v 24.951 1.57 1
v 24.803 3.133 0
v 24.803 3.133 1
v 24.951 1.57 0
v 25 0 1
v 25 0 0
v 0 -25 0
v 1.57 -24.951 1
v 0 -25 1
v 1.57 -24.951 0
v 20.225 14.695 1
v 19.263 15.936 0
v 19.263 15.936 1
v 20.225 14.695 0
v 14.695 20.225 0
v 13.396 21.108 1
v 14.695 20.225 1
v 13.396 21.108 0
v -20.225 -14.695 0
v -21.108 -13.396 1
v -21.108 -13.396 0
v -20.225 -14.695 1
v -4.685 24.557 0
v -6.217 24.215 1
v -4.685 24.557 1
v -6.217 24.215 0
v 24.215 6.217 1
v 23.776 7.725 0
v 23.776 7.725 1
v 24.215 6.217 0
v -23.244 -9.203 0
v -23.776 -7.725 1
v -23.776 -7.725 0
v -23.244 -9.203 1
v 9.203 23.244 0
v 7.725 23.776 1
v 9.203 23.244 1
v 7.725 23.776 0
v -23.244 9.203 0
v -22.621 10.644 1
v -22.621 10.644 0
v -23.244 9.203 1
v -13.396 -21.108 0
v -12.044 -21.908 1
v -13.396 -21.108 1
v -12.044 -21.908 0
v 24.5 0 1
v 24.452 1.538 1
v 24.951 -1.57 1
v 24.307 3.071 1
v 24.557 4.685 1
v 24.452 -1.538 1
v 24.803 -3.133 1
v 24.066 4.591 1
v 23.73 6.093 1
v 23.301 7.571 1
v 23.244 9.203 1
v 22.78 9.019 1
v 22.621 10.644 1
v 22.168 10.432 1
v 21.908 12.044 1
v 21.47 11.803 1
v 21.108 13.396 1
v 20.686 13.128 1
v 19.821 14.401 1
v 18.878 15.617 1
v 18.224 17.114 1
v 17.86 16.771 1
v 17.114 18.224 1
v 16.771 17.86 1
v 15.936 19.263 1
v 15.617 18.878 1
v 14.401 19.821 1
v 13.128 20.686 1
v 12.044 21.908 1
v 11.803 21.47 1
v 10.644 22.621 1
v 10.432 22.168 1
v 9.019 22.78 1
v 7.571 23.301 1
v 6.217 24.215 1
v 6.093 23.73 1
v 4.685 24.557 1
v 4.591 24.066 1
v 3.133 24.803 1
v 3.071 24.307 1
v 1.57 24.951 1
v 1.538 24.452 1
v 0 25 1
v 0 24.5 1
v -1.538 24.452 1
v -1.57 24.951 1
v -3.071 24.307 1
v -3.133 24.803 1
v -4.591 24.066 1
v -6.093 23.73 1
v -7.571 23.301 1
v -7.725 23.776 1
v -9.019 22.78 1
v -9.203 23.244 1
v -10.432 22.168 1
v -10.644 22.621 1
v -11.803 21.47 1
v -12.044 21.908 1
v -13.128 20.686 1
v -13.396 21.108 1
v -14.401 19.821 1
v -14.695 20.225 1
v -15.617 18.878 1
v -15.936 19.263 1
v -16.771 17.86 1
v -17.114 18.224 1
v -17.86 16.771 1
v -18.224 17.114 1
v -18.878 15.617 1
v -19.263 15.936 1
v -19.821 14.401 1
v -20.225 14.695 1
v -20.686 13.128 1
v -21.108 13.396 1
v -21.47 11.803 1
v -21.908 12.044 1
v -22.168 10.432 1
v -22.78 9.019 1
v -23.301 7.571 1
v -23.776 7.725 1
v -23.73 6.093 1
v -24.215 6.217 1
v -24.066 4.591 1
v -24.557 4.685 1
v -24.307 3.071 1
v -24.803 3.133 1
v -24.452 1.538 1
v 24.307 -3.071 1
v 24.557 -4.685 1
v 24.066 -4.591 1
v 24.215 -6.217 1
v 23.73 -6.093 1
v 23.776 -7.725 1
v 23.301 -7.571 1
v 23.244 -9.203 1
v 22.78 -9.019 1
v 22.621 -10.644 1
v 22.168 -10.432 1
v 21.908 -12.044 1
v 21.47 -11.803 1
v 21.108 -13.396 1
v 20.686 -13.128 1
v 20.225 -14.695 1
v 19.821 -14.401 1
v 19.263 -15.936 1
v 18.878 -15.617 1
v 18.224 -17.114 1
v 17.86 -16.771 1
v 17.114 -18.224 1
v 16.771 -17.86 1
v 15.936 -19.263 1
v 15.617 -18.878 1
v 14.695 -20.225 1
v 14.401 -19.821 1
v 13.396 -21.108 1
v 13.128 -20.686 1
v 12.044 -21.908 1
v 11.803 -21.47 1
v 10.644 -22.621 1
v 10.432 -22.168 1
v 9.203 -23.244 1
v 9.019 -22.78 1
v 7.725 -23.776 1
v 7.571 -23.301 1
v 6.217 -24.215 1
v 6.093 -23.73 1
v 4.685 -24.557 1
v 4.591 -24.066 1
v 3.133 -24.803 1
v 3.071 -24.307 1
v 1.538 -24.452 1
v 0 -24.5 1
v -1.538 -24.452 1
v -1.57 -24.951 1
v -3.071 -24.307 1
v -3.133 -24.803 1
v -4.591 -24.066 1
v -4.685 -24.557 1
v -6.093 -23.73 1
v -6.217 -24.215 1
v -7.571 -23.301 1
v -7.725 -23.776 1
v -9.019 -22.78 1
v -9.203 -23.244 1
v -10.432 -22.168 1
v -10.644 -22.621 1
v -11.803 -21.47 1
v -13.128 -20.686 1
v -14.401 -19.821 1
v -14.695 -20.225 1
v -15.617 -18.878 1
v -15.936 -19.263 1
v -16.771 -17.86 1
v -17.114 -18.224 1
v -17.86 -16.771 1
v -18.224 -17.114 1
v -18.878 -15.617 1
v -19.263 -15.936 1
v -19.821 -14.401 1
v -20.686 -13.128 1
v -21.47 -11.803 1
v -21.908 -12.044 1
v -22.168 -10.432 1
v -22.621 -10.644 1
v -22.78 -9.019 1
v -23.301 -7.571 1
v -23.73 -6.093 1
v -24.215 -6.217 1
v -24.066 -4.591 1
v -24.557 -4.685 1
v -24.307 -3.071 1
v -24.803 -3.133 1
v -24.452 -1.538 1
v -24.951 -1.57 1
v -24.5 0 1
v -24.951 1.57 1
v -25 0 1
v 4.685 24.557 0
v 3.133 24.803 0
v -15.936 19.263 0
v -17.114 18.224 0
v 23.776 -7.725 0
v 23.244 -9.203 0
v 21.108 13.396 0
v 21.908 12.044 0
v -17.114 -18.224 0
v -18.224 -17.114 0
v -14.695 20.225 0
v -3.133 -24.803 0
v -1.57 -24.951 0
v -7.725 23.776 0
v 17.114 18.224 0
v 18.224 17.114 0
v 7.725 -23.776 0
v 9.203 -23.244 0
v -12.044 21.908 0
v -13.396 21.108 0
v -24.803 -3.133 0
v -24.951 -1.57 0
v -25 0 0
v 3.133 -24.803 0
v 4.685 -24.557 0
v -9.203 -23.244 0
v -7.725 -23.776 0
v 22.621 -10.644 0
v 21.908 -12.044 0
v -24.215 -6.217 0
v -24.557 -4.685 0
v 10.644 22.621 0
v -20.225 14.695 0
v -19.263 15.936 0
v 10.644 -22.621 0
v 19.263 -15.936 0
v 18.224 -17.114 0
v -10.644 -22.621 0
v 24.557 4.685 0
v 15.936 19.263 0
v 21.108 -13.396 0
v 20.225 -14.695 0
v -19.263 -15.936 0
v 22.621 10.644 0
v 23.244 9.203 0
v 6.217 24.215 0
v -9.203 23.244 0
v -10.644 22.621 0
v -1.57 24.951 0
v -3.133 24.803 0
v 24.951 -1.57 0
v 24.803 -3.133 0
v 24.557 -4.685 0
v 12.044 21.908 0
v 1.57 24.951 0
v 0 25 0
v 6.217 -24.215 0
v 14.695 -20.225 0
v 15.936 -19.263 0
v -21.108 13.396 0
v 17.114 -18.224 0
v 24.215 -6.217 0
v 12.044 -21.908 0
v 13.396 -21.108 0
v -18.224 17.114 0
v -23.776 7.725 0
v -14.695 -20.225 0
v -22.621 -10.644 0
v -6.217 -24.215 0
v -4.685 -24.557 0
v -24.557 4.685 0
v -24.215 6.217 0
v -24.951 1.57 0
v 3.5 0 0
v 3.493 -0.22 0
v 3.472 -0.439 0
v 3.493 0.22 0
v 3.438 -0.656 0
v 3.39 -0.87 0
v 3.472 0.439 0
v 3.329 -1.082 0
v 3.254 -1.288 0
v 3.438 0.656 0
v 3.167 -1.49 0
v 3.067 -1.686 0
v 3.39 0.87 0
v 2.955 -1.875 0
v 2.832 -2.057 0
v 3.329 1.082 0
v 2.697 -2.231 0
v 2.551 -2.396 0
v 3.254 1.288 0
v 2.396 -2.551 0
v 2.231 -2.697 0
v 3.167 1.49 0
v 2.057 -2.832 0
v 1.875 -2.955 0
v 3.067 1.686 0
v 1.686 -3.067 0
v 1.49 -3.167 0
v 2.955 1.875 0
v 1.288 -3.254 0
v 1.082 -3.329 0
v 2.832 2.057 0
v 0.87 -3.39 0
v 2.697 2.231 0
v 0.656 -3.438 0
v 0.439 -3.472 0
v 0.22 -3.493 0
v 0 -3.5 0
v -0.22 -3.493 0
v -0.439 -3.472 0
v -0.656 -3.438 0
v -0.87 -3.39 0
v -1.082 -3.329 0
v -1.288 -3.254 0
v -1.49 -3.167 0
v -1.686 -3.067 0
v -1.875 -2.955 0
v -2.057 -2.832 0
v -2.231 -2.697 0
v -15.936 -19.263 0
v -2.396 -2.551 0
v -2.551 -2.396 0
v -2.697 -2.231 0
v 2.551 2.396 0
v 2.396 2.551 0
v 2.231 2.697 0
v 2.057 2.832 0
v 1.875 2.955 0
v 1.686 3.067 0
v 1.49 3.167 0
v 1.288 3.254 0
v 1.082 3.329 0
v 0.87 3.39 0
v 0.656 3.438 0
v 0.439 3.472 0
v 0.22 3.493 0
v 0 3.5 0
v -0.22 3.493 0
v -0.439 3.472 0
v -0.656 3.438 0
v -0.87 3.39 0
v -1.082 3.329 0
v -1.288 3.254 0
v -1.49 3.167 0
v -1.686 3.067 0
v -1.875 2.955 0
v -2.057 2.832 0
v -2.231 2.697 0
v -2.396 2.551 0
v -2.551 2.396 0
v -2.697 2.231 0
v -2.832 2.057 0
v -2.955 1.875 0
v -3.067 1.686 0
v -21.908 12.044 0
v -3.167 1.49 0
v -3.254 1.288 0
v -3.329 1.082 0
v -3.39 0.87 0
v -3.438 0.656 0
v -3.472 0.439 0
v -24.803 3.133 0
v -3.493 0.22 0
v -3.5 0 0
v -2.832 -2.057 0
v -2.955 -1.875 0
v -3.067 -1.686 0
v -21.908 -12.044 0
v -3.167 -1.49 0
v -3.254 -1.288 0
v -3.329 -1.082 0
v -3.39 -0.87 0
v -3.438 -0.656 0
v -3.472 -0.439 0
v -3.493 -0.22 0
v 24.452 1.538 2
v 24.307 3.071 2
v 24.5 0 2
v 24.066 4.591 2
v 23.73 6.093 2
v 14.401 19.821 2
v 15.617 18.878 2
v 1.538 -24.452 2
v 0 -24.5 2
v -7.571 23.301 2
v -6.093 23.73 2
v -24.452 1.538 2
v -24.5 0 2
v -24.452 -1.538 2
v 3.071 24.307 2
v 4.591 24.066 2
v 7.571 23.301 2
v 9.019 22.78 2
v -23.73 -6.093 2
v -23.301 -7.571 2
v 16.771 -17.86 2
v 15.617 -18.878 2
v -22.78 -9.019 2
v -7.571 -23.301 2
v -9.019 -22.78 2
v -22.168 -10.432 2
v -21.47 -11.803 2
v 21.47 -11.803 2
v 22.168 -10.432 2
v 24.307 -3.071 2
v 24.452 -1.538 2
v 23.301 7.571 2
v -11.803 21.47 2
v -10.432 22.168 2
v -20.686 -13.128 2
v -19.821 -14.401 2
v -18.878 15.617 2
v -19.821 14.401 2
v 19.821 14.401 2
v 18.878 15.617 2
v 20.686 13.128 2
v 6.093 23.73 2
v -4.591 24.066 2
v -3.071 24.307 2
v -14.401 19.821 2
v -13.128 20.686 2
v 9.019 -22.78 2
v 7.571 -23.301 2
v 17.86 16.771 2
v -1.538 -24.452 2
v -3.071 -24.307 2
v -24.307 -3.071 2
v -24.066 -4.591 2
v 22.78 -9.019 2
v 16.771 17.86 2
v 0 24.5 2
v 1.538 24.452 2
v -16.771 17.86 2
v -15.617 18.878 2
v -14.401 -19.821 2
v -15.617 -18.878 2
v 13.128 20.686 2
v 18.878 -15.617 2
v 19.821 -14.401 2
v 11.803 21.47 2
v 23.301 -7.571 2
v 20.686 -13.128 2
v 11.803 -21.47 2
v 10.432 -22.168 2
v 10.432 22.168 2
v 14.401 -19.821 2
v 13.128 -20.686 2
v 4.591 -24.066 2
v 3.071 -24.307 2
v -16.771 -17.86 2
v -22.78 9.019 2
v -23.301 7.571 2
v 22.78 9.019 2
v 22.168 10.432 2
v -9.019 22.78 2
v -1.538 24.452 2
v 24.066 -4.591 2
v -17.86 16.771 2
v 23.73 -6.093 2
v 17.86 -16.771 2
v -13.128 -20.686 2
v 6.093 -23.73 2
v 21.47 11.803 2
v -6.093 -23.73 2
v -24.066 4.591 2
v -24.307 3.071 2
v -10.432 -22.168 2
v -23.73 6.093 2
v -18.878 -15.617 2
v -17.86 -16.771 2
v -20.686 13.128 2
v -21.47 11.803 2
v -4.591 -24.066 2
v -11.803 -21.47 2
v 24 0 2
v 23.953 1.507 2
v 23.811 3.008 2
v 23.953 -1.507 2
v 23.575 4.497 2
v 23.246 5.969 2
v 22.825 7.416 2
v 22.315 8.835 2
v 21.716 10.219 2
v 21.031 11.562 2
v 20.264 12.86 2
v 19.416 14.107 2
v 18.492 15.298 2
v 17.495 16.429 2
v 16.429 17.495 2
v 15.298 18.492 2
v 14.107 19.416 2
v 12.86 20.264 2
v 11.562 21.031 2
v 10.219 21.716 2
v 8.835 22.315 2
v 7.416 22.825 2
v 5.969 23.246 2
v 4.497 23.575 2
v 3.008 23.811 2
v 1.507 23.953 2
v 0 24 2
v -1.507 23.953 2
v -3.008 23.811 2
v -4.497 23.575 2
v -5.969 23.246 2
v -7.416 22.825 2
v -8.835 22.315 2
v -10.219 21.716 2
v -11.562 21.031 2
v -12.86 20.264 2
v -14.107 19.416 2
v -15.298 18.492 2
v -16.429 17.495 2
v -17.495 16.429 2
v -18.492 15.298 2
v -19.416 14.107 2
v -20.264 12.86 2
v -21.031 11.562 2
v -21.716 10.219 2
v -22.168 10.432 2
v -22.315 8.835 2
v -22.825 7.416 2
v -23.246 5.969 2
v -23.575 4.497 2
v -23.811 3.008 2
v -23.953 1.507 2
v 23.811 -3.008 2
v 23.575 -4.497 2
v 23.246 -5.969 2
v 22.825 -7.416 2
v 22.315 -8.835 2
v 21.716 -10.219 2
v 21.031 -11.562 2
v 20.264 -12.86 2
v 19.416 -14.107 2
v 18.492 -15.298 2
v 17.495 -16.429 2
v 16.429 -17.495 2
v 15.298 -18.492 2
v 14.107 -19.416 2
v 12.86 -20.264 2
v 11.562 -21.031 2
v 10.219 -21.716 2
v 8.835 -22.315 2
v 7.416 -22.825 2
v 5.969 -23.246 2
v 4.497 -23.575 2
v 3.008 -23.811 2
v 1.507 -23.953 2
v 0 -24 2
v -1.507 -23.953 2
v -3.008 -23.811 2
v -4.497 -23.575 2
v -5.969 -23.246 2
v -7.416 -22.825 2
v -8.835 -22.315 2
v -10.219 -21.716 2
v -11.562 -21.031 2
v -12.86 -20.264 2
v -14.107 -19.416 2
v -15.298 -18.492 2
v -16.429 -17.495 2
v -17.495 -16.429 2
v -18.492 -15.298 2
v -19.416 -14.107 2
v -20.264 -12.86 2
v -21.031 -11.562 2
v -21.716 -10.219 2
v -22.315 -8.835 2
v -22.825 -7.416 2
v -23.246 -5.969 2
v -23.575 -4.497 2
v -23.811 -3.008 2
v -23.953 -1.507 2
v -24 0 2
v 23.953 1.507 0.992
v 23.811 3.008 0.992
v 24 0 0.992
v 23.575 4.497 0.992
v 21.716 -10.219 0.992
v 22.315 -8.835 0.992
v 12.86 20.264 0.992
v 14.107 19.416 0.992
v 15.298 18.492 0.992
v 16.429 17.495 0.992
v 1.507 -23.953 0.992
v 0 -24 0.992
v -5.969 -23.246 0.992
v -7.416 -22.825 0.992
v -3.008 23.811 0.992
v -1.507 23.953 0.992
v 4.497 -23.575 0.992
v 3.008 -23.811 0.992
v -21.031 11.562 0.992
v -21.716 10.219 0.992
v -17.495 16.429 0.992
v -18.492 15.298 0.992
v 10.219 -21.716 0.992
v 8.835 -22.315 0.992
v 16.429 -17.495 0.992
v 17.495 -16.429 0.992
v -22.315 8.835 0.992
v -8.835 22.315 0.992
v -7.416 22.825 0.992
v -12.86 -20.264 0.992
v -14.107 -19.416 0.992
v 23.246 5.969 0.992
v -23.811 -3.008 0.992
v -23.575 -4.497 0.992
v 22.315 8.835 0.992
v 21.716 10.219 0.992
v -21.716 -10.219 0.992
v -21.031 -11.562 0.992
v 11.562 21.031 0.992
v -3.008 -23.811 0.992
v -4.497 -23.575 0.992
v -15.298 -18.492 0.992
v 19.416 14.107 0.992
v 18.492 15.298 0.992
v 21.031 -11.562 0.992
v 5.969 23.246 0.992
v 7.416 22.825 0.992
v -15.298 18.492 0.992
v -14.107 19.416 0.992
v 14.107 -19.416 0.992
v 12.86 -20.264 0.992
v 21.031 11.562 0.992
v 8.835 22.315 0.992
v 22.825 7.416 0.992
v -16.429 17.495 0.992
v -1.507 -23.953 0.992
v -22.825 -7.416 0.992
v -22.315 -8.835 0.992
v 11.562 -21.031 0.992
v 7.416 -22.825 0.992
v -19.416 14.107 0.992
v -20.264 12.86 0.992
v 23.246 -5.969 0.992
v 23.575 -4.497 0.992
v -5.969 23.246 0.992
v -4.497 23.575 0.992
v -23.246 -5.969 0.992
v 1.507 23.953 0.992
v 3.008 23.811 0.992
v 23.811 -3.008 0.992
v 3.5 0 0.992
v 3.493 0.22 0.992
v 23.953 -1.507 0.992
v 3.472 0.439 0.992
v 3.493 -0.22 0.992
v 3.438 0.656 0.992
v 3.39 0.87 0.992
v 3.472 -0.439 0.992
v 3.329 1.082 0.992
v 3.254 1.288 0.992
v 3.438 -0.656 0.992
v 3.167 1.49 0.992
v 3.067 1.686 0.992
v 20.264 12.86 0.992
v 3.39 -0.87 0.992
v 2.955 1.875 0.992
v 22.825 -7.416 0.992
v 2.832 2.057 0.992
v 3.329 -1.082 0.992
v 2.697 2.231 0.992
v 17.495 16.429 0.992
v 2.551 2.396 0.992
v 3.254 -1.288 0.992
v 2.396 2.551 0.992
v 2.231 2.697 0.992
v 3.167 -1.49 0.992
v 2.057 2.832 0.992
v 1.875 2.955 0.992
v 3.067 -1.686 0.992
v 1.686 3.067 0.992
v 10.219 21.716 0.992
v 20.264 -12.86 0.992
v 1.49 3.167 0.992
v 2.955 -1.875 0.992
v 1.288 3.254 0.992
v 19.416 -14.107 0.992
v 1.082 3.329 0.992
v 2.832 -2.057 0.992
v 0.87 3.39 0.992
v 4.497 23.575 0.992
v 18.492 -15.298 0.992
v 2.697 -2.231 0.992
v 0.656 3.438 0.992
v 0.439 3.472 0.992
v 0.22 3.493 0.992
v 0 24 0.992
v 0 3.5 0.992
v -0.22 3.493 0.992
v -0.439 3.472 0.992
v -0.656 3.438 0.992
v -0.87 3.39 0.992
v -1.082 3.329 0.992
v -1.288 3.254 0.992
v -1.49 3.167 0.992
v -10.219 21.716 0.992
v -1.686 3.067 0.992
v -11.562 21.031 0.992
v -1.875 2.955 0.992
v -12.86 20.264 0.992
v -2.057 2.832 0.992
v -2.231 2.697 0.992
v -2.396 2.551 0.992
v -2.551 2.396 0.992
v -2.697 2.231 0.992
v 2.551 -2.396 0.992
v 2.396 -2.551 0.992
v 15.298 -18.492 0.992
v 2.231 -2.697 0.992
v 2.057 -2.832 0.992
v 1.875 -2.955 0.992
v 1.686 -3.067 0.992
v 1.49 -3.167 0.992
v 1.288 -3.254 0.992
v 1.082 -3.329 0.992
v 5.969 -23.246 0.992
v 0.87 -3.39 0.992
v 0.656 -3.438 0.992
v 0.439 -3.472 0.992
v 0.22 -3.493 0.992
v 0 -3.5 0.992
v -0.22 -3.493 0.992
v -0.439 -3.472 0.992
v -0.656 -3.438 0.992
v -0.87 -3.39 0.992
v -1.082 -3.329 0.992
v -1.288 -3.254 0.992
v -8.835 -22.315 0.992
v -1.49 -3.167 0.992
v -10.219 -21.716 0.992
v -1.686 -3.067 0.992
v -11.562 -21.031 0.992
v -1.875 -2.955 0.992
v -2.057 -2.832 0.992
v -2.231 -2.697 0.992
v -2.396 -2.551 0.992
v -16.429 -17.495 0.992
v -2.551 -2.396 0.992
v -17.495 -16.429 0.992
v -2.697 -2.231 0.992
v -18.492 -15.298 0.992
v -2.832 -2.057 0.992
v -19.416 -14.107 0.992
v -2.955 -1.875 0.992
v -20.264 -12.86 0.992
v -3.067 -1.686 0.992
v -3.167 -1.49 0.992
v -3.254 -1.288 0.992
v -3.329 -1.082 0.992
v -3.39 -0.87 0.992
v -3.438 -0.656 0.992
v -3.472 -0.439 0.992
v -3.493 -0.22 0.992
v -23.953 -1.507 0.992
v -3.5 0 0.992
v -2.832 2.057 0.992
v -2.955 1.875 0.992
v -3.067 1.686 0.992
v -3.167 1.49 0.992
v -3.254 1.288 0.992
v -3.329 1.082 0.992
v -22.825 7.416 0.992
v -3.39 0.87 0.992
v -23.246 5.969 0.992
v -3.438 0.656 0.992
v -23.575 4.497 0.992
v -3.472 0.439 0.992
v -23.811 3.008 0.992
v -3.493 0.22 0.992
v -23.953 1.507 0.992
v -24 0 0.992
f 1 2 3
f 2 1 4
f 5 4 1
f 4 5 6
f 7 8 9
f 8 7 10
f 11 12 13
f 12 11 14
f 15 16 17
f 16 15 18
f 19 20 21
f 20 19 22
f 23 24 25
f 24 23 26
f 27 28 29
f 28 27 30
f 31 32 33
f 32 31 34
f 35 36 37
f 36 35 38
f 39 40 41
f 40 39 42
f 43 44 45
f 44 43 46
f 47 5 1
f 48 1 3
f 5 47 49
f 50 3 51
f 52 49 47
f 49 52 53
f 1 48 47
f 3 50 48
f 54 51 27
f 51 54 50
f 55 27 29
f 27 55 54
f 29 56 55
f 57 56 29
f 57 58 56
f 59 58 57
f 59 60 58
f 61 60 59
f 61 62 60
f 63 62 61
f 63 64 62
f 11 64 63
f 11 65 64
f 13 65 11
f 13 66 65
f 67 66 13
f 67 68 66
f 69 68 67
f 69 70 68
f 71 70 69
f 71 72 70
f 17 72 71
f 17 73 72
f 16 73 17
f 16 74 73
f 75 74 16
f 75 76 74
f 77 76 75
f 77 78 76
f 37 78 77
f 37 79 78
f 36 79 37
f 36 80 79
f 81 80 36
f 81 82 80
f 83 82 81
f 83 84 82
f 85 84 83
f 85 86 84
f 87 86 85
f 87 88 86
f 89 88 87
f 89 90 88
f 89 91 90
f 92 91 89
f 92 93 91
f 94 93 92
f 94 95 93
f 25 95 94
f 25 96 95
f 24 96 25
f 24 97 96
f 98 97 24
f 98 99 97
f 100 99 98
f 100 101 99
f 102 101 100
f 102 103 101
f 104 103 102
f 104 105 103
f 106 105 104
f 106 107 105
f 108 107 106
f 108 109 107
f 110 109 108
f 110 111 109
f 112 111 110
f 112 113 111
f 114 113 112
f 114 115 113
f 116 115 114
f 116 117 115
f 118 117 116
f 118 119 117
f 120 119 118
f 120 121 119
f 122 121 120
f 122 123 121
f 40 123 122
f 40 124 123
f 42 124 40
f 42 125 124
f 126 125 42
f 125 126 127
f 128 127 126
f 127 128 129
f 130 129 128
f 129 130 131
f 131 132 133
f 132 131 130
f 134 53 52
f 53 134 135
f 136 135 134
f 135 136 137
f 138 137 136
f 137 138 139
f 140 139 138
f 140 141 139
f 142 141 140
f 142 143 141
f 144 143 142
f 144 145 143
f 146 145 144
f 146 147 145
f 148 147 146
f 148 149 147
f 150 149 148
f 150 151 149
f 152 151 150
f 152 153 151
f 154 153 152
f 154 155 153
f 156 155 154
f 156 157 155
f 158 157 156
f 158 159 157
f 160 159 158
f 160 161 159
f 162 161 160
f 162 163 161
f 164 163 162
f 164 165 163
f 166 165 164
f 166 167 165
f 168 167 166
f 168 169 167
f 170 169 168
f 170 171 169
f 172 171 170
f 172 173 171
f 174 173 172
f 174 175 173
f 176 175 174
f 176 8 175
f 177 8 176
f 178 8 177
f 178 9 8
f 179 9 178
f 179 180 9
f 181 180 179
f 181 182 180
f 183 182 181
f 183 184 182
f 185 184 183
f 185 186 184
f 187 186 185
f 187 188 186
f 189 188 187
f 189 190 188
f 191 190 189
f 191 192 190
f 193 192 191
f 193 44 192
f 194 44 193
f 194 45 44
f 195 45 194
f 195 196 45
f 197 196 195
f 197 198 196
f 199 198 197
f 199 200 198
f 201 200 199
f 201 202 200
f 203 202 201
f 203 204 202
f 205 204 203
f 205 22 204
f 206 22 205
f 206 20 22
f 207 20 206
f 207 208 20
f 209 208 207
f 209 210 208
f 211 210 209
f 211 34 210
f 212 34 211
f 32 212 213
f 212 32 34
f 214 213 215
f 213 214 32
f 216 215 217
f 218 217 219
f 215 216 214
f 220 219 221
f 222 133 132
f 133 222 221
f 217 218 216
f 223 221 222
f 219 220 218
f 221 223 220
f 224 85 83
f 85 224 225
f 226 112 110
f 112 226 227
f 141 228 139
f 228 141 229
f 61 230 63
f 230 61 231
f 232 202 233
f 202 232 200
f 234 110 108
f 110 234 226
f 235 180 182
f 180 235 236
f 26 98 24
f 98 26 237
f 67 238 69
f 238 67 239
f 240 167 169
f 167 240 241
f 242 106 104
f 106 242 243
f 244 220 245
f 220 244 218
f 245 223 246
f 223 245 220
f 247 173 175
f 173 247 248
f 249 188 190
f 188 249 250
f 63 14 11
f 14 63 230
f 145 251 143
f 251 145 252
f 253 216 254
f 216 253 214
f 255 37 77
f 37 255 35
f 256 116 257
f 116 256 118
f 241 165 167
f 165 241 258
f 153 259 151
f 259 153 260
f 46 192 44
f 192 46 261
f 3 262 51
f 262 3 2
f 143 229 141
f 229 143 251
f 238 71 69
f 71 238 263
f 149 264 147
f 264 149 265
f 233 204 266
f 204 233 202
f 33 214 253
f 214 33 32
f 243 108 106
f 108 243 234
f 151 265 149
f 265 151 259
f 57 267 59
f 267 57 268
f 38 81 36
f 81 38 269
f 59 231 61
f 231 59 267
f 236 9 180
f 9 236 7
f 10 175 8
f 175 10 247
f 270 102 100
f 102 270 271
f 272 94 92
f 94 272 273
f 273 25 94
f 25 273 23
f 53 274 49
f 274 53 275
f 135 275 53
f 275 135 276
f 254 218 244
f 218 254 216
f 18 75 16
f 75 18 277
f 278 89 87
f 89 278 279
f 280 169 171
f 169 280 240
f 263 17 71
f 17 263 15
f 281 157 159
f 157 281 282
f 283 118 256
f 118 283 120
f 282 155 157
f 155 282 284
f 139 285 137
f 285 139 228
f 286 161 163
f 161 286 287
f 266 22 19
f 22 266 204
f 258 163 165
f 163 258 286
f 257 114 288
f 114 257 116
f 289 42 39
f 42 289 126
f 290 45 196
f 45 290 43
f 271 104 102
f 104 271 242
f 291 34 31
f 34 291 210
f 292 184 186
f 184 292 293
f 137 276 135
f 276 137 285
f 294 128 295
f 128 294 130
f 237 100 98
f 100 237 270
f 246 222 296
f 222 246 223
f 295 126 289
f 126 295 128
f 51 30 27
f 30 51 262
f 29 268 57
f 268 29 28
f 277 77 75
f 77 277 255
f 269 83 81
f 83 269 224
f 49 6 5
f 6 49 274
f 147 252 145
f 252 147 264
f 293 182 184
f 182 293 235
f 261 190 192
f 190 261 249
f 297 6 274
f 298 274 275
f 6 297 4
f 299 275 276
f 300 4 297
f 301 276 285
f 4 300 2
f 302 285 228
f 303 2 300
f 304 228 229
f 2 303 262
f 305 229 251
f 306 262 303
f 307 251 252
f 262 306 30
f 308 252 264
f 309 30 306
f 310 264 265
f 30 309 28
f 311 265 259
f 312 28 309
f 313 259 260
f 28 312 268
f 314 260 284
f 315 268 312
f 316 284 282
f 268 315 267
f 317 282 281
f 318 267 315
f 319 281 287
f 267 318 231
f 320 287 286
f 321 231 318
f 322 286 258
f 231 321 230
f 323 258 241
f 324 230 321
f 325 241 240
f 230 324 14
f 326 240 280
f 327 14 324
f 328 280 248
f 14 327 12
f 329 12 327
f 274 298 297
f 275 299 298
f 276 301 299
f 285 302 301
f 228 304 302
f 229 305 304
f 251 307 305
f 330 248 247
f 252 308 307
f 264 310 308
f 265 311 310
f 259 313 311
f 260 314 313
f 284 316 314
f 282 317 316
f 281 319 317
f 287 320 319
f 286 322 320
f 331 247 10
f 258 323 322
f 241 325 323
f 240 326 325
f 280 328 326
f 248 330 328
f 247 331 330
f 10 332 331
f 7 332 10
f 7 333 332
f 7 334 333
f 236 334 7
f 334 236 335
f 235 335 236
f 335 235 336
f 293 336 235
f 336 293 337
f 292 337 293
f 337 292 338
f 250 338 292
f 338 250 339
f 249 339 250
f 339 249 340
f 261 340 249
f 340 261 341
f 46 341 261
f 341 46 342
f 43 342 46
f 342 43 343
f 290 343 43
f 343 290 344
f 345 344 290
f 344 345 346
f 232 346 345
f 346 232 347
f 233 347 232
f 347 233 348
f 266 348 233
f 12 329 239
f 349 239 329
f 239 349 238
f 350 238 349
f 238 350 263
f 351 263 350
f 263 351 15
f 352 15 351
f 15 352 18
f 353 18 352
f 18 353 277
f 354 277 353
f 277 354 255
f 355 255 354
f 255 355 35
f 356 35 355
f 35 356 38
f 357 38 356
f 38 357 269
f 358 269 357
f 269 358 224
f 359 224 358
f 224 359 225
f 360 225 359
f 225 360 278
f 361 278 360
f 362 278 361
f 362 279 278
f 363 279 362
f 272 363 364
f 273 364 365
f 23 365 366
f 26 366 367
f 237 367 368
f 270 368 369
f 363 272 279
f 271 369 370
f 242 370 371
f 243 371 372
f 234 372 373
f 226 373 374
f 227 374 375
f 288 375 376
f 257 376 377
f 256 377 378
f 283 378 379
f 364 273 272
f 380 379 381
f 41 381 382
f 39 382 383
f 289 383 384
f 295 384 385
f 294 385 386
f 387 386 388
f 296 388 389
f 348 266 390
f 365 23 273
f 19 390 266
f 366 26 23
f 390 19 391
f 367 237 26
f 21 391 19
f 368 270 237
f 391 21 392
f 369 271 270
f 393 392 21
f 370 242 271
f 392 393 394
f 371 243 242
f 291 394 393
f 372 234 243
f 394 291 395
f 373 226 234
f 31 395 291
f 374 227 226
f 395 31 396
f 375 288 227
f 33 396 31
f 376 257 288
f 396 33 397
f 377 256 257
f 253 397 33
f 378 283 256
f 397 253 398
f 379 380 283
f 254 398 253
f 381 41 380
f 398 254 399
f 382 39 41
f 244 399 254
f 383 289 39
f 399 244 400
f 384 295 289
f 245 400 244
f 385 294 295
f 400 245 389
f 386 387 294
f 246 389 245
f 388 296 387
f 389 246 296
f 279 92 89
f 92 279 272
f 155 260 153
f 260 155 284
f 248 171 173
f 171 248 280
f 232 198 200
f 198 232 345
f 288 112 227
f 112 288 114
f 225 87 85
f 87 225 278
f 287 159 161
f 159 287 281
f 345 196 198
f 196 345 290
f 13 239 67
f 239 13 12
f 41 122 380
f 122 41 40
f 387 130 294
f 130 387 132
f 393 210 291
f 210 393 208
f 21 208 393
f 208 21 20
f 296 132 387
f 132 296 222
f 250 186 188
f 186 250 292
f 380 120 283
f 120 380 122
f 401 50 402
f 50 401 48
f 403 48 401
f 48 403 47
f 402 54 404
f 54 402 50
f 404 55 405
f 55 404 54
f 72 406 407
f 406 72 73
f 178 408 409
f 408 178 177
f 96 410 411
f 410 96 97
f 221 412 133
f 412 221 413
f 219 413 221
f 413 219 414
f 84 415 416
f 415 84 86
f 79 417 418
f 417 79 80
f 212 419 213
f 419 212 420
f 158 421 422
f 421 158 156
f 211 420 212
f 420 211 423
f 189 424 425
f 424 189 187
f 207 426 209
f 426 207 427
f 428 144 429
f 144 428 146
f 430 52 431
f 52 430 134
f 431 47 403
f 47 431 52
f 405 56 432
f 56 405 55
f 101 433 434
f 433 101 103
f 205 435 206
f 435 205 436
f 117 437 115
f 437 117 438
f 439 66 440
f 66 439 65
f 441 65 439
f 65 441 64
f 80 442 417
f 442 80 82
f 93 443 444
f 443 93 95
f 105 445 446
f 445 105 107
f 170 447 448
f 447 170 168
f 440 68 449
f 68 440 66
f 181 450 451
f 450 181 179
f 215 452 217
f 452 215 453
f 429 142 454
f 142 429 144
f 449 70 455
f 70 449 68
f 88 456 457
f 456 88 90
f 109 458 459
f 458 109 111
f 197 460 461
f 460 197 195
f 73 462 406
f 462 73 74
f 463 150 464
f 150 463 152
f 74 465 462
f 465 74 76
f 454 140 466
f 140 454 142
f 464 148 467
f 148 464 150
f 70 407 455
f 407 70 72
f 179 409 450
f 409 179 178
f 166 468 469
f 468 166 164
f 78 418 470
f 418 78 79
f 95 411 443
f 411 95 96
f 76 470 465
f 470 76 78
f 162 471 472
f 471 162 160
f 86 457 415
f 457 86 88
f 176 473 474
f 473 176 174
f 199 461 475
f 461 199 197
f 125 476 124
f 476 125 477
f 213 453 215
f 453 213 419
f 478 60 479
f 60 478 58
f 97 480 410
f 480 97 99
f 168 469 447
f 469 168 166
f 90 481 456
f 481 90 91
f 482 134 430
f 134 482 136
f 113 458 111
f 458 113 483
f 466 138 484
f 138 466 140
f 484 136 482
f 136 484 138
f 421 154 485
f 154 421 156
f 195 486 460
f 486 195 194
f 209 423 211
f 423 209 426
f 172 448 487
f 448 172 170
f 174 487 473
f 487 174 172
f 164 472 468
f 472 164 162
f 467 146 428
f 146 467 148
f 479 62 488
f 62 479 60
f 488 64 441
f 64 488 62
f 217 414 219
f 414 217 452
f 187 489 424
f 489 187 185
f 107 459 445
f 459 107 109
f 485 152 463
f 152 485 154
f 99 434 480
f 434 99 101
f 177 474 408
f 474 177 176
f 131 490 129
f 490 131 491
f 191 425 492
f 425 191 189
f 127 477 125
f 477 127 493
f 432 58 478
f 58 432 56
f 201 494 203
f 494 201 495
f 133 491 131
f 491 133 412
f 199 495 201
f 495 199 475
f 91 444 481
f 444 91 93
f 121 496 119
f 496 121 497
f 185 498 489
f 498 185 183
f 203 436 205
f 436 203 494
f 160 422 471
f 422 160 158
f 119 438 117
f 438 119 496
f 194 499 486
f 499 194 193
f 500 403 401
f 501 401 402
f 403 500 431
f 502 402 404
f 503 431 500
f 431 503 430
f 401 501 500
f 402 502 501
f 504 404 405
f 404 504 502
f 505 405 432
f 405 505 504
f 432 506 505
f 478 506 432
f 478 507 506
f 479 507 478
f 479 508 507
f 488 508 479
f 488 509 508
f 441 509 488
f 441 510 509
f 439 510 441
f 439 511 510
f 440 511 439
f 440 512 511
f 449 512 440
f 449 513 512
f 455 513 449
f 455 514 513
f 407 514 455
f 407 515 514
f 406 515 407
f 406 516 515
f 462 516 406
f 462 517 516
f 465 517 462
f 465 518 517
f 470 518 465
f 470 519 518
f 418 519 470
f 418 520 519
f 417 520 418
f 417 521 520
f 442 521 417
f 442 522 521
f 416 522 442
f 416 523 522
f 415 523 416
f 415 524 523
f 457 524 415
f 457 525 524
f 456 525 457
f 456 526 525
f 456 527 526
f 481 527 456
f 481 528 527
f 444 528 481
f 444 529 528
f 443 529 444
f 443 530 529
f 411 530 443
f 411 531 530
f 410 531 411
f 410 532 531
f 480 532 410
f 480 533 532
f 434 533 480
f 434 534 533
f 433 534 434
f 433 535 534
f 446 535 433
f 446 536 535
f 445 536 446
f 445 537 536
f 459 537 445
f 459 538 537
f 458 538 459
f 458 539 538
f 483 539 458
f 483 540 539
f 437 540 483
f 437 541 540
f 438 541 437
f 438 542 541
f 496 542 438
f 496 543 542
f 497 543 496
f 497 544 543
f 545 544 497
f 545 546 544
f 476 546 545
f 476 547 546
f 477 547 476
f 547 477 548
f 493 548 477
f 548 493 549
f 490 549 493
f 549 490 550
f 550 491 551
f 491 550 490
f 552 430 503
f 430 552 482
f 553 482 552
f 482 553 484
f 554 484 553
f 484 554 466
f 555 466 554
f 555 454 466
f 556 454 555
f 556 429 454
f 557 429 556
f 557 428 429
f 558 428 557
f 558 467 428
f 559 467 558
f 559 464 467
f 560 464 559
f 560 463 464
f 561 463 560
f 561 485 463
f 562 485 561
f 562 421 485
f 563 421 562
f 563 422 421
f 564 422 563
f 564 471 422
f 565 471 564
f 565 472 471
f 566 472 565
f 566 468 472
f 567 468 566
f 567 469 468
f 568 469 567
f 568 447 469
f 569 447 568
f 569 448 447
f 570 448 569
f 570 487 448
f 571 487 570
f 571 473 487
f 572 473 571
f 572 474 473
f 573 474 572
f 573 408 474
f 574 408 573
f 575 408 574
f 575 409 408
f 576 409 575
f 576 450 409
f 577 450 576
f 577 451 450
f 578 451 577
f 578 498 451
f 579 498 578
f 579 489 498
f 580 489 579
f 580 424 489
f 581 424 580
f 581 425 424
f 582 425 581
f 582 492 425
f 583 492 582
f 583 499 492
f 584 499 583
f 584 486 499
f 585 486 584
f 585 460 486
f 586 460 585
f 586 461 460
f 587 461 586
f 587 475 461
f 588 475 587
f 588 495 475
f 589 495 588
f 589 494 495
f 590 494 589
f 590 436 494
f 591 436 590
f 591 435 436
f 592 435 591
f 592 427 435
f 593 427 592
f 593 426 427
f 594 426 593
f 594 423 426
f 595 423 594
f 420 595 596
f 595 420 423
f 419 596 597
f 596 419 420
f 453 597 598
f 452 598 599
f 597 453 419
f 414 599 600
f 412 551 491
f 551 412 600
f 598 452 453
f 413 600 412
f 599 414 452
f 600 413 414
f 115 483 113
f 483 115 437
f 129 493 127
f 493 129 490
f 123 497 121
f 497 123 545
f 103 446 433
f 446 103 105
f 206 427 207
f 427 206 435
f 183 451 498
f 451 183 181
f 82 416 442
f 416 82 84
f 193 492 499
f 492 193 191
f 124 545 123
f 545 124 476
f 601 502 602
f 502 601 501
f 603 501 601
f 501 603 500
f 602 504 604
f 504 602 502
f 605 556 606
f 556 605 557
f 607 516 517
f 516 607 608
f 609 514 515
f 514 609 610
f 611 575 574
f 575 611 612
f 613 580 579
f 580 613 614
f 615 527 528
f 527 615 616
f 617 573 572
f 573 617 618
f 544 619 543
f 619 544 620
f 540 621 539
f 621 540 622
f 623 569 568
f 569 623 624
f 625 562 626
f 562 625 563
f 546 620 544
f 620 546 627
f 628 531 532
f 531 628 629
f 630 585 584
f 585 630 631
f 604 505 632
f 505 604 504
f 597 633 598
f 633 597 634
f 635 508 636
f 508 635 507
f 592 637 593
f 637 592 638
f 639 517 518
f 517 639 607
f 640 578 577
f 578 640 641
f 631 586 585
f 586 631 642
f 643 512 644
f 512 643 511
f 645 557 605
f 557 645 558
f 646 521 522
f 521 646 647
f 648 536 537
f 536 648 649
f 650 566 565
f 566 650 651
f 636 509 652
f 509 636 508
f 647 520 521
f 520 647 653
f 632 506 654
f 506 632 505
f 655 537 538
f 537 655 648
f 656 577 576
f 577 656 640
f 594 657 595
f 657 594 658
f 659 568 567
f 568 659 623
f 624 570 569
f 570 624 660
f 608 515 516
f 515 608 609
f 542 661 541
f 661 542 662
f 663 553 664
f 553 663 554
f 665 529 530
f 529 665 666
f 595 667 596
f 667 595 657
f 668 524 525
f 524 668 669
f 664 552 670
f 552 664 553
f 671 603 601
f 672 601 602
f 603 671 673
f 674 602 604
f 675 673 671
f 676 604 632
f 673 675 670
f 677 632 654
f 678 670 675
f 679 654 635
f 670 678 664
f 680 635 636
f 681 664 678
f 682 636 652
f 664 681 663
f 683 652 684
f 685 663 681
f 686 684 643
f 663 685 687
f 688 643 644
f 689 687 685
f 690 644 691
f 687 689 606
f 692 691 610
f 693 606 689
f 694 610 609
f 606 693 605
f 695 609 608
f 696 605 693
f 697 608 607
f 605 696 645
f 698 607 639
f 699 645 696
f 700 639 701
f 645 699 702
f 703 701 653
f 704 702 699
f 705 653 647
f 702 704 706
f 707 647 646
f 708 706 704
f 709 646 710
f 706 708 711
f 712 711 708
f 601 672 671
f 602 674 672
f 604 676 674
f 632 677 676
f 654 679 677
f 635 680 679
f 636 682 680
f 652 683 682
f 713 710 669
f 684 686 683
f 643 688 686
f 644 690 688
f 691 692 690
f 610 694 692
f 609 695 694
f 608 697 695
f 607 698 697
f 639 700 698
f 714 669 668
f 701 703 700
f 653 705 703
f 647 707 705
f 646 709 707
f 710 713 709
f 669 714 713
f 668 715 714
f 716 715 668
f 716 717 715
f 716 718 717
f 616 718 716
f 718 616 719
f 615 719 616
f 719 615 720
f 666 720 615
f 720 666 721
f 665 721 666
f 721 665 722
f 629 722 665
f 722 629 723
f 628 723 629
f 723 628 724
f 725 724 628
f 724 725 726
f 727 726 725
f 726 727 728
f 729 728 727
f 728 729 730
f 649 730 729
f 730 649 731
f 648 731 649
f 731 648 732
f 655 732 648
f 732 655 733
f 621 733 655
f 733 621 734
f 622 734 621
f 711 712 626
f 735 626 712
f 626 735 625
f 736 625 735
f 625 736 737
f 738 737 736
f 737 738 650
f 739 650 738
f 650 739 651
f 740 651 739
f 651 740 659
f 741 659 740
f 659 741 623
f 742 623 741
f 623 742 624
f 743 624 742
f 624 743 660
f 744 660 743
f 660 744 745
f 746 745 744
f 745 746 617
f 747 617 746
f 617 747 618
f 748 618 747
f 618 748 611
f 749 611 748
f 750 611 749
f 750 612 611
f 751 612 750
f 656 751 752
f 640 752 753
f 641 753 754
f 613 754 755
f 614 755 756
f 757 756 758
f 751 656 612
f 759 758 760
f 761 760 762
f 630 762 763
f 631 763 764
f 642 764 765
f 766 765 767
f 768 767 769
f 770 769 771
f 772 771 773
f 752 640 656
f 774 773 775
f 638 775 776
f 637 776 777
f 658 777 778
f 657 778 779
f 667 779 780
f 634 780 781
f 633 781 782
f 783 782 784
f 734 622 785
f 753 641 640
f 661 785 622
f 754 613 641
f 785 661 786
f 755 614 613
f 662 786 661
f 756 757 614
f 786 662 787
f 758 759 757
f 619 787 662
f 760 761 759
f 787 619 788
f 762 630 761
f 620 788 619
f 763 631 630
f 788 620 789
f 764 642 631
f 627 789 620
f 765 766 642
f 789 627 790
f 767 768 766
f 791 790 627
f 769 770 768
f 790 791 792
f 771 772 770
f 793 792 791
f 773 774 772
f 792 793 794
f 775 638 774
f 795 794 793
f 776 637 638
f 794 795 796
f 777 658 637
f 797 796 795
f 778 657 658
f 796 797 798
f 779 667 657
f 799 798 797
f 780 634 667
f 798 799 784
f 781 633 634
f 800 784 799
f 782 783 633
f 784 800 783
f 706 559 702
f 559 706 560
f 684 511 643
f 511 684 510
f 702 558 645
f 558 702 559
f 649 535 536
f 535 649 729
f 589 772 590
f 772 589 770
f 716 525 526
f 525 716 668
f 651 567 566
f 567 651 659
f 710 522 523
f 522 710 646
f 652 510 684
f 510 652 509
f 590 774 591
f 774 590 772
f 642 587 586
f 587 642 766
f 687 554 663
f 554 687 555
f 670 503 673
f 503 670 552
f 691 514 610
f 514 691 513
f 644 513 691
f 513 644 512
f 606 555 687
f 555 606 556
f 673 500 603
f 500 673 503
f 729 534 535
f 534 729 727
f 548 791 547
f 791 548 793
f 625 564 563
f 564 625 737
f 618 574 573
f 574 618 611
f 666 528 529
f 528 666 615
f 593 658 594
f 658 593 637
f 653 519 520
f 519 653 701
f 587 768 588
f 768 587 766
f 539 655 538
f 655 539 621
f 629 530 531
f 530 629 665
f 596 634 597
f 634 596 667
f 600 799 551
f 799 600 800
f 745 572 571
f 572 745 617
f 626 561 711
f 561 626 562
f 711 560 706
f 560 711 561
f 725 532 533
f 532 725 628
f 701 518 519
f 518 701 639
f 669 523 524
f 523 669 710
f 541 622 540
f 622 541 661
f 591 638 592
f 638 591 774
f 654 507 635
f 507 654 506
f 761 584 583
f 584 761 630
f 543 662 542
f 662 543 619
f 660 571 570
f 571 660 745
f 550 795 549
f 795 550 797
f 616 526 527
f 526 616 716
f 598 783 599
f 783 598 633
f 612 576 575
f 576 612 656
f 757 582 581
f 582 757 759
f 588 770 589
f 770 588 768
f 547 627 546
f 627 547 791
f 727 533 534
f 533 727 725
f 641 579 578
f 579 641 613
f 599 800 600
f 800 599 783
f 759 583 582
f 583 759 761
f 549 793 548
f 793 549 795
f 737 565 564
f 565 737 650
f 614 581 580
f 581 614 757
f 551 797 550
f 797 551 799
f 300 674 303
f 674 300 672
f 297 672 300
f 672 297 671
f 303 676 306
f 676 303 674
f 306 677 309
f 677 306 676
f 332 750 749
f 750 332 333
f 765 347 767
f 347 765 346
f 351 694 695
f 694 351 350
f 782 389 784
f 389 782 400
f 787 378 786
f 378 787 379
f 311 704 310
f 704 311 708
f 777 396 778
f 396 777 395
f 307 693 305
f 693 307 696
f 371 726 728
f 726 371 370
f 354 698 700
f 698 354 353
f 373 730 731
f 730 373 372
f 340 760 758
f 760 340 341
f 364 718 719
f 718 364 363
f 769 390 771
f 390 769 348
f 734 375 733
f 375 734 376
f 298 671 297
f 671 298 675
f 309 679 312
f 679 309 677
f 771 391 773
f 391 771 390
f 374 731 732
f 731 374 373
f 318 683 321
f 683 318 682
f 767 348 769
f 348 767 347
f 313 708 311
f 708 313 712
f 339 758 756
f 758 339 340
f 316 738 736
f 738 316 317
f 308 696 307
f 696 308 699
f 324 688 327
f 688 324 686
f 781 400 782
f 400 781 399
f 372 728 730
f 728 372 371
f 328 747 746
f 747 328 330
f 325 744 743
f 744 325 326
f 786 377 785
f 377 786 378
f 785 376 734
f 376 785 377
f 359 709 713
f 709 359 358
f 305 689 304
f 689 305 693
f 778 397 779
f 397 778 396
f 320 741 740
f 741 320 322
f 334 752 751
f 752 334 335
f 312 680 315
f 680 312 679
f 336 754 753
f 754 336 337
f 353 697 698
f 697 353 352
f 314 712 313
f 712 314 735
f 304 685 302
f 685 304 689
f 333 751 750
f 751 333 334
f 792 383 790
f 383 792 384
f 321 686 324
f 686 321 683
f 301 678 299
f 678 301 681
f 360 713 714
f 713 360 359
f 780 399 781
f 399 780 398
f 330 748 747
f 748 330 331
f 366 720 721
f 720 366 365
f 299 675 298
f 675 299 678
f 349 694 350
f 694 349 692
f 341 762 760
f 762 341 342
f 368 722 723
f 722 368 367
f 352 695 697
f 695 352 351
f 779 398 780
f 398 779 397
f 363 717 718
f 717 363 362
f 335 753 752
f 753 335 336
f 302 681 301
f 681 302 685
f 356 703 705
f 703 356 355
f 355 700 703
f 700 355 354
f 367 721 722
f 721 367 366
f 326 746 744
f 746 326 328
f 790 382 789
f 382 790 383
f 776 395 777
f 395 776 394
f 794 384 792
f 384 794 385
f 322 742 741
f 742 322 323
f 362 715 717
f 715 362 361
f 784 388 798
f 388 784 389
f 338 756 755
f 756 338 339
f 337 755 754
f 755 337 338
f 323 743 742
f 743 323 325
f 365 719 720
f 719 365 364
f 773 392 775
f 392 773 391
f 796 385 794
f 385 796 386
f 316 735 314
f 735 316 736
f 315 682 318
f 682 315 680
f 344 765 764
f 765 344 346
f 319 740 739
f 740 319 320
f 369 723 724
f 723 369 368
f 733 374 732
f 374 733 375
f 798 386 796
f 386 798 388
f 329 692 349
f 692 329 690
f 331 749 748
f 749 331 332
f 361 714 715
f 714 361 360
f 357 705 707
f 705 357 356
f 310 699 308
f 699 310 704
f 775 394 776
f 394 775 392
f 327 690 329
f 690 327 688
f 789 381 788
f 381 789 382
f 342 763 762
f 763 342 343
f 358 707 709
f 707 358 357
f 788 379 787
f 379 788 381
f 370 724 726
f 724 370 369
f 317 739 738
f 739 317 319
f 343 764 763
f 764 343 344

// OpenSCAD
eps=1/128;
$fn=100;

motor_width = 24;
motor_back_hole_width = 6.3;
motor_height = 12.36;
motor_pin_height = 20.13;

holder_height = 10;

skirt_plate_dist = 2; // distance from top skirt to magnet plate
skirt_width = 10;

plate_width = 40;

cage_width = motor_width + skirt_plate_dist + skirt_width;
cage_plate_dist = 1; // distance from top of skirt to top of plate
cage_height = motor_pin_height + cage_plate_dist;

wt = 1;

lh = 5.25; // total led height
lbh = 2.41; // led bracket height
ld = 5.79; // led bulb diameter

mh = 32.15; // height from bottom to magnet holder top
htt = 3; // spacing between magnet holder top to bottom of the top
h = mh + htt; // height of outer walls
d = 50; // diameter of outer ring of holder
owt = 2; // outer wall thickness

th = 5; // top height

bw1 = 94; // across by panel
bw2 = 87; // across after panel 
bw3 = 138; // left to right (to magnet holder)
bw4 = 76; // across panel
bwh = 40; // box wall height

sd=6+1; // switch hole diameter
pd=6.8+1; // potentionmeter hole diameter


//walls();
//

//cylinder(d=40, h=mh);

echo(h);
top();
//cage();
//translate([0,0,45]) top();

module cage() {
    difference() {
        union() {
            walls();
            translate([0,0,wt+eps]) difference() {
                cylinder(h=holder_height, r=motor_width/2+wt+0.4+0.5);
                translate([0,0,-eps]) cylinder(h=holder_height+10, r=motor_width/2+0.4+0.5);
            }
        }
        translate([20,0,(holder_height+2)/2+wt-eps]) cube([20, 5, holder_height+2], center=true);
        translate([0,0,-10]) cylinder(h=20, r=motor_back_hole_width/2);
    }
}

module walls() {
    difference() {
        cylinder(h, d=d);
        translate([0,0,wt]) cylinder(h=h+1, d=d-owt);
    }
}

module top() {
    difference() {
        union() {
            cylinder(wt, d=d);
            translate([0,0,wt]) cylinder(wt, d=d-wt);
        }
        translate([0,0,wt-eps]) cylinder(wt+wt, d=d-wt-wt);
        translate([0,0,-1])cylinder(h=5, d=7);
    }
}
